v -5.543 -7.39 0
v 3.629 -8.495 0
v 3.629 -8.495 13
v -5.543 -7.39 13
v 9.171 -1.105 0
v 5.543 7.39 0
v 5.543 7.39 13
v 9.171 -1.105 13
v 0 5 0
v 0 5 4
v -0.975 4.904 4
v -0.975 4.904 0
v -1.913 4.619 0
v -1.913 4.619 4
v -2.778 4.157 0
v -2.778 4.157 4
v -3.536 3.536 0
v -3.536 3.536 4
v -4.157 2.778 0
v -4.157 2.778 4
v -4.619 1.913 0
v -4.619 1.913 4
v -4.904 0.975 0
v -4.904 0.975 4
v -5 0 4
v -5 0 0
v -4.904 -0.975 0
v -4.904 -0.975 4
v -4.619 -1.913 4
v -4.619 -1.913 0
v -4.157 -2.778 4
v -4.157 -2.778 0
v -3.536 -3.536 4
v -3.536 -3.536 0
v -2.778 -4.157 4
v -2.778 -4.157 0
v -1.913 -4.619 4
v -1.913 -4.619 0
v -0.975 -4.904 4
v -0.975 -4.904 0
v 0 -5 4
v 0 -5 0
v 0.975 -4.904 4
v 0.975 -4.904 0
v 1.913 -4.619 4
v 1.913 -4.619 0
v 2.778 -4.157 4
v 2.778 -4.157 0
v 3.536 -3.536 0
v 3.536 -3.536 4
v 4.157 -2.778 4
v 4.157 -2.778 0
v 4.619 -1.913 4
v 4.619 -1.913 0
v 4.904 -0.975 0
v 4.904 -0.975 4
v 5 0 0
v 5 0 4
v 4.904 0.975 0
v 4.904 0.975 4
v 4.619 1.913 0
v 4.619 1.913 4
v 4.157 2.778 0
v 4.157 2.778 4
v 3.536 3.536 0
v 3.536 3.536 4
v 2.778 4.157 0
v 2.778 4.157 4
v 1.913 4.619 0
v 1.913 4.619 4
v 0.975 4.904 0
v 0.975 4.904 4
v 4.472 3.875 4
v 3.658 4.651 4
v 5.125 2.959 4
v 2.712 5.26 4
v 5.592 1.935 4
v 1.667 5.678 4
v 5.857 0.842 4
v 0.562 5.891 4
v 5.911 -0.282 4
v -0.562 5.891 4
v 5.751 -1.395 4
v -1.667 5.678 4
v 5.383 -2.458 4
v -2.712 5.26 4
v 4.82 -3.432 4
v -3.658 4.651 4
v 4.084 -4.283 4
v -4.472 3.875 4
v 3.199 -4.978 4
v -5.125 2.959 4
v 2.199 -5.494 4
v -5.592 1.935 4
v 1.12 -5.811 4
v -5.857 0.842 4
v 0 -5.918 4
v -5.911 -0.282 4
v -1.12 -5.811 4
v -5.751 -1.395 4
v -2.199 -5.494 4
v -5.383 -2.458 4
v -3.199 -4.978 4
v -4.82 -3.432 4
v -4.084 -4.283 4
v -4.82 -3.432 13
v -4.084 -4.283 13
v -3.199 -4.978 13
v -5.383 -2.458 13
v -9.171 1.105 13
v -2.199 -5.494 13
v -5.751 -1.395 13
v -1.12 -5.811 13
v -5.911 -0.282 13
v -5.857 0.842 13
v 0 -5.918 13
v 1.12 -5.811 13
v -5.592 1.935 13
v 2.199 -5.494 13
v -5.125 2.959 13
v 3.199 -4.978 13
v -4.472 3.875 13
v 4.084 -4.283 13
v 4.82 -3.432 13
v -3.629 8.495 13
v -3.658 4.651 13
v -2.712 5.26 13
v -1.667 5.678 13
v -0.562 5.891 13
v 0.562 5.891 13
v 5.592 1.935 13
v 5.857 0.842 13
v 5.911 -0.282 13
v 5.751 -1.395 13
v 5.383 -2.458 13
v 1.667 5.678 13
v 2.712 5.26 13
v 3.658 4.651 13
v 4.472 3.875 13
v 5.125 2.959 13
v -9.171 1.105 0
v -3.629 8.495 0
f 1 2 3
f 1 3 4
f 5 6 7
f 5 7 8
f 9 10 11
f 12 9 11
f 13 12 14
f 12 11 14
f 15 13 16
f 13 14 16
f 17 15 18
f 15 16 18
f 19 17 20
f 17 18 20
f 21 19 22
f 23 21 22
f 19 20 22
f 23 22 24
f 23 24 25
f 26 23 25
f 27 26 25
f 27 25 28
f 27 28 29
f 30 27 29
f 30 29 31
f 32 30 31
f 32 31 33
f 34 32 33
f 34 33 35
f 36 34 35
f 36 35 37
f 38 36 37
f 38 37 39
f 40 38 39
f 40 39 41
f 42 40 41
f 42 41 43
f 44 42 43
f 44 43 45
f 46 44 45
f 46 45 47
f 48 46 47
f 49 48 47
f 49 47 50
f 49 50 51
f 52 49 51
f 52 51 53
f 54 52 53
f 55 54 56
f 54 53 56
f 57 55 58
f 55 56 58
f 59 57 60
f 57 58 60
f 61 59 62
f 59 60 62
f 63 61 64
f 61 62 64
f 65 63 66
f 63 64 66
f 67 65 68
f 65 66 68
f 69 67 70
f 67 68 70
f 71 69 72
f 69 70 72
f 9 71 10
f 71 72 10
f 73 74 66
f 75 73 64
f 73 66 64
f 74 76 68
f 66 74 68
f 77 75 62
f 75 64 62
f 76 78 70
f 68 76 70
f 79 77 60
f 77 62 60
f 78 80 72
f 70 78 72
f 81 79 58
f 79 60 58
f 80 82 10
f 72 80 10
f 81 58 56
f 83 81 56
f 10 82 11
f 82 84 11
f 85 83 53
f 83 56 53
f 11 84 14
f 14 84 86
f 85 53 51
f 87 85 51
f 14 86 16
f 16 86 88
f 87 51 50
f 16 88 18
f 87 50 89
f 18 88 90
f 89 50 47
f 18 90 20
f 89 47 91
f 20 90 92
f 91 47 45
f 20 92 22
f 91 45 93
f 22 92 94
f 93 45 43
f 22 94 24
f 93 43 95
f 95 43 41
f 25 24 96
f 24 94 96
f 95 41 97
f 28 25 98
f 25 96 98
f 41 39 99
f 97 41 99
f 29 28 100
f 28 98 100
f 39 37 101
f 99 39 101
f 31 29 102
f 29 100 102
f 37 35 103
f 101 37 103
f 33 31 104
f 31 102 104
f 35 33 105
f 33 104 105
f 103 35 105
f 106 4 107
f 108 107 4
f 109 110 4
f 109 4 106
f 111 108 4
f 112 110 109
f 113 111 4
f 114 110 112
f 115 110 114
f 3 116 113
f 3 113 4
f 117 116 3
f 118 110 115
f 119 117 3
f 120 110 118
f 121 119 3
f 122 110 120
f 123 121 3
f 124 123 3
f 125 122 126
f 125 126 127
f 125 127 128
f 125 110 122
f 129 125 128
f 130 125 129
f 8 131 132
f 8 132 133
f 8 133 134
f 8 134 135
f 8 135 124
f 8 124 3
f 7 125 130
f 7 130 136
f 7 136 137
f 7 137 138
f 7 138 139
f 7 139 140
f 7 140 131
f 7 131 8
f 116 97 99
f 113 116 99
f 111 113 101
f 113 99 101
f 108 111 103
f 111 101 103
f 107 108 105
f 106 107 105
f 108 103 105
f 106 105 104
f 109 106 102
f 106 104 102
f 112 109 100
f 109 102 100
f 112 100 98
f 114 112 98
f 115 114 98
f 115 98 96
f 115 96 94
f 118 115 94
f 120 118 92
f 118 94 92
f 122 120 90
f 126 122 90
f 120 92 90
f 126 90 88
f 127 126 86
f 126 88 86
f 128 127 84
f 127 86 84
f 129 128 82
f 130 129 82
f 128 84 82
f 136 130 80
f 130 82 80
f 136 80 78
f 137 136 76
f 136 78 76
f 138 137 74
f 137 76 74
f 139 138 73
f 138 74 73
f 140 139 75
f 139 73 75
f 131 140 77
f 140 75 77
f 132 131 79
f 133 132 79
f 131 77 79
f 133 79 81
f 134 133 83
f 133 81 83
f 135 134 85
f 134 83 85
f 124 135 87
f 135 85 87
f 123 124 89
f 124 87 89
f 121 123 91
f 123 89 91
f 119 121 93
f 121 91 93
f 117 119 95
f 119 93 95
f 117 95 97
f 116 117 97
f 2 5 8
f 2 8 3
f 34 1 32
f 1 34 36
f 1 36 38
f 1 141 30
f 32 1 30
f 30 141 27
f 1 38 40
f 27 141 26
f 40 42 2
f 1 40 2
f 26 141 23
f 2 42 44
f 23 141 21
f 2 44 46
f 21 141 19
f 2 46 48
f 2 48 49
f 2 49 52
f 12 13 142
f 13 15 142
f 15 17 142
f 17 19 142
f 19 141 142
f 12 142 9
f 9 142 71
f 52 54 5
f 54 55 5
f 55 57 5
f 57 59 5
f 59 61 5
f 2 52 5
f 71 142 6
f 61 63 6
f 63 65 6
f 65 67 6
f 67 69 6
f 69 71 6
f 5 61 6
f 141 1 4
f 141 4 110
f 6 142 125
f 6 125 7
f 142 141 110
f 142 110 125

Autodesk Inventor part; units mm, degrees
ref_plane "YZ Plane" through (0, 0, 0) normal (1, 0, 0) x (0, 1, 0)
ref_plane "XZ Plane" through (0, 0, 0) normal (0, 1, 0) x (-1, 0, 0)
ref_plane "XY Plane" through (0, 0, 0) normal (0, 0, 1) x (1, 0, 0)
sketch "Sketch1" plane through (0, 0, 0) normal (0, 0, 1) x (1, 0, 0)
  line L0 (-5.5426, -7.3901) -> (-9.1713, 1.105)
  line L1 (-9.1713, 1.105) -> (-3.6287, 8.495)
  line L2 (-3.6287, 8.495) -> (5.5426, 7.3901)
  line L3 (5.5426, 7.3901) -> (9.1713, -1.105)
  line L4 (9.1713, -1.105) -> (3.6287, -8.495)
  line L5 (3.6287, -8.495) -> (-5.5426, -7.3901)
  point P0 (0, 0)
  point P1 (0, 0)
  dimension "d0" = 16
extrude "Extrusion1" add sketch "Sketch1" along normal blind 13
sketch "Sketch2" plane through (0, 0, 13) normal (0, 0, 1) x (1, 0, 0)
  point P0 (0, 0)
hole "Hole1" at (0, 0, 13) direction (0, 0, -1) diameter 11.835 depth 9 thread size "M14x2" class "6H" standard "ANSI Metric M Profile"
sketch "Sketch3" plane through (0, 0, 0) normal (0, 0, -1) x (-1, 0, 0)
  point P0 (0, 0)
hole "Hole2" at (0, 0, 0) direction (0, 0, 1) diameter 10 depth 9
properties part number "HUDSON-1-108"
